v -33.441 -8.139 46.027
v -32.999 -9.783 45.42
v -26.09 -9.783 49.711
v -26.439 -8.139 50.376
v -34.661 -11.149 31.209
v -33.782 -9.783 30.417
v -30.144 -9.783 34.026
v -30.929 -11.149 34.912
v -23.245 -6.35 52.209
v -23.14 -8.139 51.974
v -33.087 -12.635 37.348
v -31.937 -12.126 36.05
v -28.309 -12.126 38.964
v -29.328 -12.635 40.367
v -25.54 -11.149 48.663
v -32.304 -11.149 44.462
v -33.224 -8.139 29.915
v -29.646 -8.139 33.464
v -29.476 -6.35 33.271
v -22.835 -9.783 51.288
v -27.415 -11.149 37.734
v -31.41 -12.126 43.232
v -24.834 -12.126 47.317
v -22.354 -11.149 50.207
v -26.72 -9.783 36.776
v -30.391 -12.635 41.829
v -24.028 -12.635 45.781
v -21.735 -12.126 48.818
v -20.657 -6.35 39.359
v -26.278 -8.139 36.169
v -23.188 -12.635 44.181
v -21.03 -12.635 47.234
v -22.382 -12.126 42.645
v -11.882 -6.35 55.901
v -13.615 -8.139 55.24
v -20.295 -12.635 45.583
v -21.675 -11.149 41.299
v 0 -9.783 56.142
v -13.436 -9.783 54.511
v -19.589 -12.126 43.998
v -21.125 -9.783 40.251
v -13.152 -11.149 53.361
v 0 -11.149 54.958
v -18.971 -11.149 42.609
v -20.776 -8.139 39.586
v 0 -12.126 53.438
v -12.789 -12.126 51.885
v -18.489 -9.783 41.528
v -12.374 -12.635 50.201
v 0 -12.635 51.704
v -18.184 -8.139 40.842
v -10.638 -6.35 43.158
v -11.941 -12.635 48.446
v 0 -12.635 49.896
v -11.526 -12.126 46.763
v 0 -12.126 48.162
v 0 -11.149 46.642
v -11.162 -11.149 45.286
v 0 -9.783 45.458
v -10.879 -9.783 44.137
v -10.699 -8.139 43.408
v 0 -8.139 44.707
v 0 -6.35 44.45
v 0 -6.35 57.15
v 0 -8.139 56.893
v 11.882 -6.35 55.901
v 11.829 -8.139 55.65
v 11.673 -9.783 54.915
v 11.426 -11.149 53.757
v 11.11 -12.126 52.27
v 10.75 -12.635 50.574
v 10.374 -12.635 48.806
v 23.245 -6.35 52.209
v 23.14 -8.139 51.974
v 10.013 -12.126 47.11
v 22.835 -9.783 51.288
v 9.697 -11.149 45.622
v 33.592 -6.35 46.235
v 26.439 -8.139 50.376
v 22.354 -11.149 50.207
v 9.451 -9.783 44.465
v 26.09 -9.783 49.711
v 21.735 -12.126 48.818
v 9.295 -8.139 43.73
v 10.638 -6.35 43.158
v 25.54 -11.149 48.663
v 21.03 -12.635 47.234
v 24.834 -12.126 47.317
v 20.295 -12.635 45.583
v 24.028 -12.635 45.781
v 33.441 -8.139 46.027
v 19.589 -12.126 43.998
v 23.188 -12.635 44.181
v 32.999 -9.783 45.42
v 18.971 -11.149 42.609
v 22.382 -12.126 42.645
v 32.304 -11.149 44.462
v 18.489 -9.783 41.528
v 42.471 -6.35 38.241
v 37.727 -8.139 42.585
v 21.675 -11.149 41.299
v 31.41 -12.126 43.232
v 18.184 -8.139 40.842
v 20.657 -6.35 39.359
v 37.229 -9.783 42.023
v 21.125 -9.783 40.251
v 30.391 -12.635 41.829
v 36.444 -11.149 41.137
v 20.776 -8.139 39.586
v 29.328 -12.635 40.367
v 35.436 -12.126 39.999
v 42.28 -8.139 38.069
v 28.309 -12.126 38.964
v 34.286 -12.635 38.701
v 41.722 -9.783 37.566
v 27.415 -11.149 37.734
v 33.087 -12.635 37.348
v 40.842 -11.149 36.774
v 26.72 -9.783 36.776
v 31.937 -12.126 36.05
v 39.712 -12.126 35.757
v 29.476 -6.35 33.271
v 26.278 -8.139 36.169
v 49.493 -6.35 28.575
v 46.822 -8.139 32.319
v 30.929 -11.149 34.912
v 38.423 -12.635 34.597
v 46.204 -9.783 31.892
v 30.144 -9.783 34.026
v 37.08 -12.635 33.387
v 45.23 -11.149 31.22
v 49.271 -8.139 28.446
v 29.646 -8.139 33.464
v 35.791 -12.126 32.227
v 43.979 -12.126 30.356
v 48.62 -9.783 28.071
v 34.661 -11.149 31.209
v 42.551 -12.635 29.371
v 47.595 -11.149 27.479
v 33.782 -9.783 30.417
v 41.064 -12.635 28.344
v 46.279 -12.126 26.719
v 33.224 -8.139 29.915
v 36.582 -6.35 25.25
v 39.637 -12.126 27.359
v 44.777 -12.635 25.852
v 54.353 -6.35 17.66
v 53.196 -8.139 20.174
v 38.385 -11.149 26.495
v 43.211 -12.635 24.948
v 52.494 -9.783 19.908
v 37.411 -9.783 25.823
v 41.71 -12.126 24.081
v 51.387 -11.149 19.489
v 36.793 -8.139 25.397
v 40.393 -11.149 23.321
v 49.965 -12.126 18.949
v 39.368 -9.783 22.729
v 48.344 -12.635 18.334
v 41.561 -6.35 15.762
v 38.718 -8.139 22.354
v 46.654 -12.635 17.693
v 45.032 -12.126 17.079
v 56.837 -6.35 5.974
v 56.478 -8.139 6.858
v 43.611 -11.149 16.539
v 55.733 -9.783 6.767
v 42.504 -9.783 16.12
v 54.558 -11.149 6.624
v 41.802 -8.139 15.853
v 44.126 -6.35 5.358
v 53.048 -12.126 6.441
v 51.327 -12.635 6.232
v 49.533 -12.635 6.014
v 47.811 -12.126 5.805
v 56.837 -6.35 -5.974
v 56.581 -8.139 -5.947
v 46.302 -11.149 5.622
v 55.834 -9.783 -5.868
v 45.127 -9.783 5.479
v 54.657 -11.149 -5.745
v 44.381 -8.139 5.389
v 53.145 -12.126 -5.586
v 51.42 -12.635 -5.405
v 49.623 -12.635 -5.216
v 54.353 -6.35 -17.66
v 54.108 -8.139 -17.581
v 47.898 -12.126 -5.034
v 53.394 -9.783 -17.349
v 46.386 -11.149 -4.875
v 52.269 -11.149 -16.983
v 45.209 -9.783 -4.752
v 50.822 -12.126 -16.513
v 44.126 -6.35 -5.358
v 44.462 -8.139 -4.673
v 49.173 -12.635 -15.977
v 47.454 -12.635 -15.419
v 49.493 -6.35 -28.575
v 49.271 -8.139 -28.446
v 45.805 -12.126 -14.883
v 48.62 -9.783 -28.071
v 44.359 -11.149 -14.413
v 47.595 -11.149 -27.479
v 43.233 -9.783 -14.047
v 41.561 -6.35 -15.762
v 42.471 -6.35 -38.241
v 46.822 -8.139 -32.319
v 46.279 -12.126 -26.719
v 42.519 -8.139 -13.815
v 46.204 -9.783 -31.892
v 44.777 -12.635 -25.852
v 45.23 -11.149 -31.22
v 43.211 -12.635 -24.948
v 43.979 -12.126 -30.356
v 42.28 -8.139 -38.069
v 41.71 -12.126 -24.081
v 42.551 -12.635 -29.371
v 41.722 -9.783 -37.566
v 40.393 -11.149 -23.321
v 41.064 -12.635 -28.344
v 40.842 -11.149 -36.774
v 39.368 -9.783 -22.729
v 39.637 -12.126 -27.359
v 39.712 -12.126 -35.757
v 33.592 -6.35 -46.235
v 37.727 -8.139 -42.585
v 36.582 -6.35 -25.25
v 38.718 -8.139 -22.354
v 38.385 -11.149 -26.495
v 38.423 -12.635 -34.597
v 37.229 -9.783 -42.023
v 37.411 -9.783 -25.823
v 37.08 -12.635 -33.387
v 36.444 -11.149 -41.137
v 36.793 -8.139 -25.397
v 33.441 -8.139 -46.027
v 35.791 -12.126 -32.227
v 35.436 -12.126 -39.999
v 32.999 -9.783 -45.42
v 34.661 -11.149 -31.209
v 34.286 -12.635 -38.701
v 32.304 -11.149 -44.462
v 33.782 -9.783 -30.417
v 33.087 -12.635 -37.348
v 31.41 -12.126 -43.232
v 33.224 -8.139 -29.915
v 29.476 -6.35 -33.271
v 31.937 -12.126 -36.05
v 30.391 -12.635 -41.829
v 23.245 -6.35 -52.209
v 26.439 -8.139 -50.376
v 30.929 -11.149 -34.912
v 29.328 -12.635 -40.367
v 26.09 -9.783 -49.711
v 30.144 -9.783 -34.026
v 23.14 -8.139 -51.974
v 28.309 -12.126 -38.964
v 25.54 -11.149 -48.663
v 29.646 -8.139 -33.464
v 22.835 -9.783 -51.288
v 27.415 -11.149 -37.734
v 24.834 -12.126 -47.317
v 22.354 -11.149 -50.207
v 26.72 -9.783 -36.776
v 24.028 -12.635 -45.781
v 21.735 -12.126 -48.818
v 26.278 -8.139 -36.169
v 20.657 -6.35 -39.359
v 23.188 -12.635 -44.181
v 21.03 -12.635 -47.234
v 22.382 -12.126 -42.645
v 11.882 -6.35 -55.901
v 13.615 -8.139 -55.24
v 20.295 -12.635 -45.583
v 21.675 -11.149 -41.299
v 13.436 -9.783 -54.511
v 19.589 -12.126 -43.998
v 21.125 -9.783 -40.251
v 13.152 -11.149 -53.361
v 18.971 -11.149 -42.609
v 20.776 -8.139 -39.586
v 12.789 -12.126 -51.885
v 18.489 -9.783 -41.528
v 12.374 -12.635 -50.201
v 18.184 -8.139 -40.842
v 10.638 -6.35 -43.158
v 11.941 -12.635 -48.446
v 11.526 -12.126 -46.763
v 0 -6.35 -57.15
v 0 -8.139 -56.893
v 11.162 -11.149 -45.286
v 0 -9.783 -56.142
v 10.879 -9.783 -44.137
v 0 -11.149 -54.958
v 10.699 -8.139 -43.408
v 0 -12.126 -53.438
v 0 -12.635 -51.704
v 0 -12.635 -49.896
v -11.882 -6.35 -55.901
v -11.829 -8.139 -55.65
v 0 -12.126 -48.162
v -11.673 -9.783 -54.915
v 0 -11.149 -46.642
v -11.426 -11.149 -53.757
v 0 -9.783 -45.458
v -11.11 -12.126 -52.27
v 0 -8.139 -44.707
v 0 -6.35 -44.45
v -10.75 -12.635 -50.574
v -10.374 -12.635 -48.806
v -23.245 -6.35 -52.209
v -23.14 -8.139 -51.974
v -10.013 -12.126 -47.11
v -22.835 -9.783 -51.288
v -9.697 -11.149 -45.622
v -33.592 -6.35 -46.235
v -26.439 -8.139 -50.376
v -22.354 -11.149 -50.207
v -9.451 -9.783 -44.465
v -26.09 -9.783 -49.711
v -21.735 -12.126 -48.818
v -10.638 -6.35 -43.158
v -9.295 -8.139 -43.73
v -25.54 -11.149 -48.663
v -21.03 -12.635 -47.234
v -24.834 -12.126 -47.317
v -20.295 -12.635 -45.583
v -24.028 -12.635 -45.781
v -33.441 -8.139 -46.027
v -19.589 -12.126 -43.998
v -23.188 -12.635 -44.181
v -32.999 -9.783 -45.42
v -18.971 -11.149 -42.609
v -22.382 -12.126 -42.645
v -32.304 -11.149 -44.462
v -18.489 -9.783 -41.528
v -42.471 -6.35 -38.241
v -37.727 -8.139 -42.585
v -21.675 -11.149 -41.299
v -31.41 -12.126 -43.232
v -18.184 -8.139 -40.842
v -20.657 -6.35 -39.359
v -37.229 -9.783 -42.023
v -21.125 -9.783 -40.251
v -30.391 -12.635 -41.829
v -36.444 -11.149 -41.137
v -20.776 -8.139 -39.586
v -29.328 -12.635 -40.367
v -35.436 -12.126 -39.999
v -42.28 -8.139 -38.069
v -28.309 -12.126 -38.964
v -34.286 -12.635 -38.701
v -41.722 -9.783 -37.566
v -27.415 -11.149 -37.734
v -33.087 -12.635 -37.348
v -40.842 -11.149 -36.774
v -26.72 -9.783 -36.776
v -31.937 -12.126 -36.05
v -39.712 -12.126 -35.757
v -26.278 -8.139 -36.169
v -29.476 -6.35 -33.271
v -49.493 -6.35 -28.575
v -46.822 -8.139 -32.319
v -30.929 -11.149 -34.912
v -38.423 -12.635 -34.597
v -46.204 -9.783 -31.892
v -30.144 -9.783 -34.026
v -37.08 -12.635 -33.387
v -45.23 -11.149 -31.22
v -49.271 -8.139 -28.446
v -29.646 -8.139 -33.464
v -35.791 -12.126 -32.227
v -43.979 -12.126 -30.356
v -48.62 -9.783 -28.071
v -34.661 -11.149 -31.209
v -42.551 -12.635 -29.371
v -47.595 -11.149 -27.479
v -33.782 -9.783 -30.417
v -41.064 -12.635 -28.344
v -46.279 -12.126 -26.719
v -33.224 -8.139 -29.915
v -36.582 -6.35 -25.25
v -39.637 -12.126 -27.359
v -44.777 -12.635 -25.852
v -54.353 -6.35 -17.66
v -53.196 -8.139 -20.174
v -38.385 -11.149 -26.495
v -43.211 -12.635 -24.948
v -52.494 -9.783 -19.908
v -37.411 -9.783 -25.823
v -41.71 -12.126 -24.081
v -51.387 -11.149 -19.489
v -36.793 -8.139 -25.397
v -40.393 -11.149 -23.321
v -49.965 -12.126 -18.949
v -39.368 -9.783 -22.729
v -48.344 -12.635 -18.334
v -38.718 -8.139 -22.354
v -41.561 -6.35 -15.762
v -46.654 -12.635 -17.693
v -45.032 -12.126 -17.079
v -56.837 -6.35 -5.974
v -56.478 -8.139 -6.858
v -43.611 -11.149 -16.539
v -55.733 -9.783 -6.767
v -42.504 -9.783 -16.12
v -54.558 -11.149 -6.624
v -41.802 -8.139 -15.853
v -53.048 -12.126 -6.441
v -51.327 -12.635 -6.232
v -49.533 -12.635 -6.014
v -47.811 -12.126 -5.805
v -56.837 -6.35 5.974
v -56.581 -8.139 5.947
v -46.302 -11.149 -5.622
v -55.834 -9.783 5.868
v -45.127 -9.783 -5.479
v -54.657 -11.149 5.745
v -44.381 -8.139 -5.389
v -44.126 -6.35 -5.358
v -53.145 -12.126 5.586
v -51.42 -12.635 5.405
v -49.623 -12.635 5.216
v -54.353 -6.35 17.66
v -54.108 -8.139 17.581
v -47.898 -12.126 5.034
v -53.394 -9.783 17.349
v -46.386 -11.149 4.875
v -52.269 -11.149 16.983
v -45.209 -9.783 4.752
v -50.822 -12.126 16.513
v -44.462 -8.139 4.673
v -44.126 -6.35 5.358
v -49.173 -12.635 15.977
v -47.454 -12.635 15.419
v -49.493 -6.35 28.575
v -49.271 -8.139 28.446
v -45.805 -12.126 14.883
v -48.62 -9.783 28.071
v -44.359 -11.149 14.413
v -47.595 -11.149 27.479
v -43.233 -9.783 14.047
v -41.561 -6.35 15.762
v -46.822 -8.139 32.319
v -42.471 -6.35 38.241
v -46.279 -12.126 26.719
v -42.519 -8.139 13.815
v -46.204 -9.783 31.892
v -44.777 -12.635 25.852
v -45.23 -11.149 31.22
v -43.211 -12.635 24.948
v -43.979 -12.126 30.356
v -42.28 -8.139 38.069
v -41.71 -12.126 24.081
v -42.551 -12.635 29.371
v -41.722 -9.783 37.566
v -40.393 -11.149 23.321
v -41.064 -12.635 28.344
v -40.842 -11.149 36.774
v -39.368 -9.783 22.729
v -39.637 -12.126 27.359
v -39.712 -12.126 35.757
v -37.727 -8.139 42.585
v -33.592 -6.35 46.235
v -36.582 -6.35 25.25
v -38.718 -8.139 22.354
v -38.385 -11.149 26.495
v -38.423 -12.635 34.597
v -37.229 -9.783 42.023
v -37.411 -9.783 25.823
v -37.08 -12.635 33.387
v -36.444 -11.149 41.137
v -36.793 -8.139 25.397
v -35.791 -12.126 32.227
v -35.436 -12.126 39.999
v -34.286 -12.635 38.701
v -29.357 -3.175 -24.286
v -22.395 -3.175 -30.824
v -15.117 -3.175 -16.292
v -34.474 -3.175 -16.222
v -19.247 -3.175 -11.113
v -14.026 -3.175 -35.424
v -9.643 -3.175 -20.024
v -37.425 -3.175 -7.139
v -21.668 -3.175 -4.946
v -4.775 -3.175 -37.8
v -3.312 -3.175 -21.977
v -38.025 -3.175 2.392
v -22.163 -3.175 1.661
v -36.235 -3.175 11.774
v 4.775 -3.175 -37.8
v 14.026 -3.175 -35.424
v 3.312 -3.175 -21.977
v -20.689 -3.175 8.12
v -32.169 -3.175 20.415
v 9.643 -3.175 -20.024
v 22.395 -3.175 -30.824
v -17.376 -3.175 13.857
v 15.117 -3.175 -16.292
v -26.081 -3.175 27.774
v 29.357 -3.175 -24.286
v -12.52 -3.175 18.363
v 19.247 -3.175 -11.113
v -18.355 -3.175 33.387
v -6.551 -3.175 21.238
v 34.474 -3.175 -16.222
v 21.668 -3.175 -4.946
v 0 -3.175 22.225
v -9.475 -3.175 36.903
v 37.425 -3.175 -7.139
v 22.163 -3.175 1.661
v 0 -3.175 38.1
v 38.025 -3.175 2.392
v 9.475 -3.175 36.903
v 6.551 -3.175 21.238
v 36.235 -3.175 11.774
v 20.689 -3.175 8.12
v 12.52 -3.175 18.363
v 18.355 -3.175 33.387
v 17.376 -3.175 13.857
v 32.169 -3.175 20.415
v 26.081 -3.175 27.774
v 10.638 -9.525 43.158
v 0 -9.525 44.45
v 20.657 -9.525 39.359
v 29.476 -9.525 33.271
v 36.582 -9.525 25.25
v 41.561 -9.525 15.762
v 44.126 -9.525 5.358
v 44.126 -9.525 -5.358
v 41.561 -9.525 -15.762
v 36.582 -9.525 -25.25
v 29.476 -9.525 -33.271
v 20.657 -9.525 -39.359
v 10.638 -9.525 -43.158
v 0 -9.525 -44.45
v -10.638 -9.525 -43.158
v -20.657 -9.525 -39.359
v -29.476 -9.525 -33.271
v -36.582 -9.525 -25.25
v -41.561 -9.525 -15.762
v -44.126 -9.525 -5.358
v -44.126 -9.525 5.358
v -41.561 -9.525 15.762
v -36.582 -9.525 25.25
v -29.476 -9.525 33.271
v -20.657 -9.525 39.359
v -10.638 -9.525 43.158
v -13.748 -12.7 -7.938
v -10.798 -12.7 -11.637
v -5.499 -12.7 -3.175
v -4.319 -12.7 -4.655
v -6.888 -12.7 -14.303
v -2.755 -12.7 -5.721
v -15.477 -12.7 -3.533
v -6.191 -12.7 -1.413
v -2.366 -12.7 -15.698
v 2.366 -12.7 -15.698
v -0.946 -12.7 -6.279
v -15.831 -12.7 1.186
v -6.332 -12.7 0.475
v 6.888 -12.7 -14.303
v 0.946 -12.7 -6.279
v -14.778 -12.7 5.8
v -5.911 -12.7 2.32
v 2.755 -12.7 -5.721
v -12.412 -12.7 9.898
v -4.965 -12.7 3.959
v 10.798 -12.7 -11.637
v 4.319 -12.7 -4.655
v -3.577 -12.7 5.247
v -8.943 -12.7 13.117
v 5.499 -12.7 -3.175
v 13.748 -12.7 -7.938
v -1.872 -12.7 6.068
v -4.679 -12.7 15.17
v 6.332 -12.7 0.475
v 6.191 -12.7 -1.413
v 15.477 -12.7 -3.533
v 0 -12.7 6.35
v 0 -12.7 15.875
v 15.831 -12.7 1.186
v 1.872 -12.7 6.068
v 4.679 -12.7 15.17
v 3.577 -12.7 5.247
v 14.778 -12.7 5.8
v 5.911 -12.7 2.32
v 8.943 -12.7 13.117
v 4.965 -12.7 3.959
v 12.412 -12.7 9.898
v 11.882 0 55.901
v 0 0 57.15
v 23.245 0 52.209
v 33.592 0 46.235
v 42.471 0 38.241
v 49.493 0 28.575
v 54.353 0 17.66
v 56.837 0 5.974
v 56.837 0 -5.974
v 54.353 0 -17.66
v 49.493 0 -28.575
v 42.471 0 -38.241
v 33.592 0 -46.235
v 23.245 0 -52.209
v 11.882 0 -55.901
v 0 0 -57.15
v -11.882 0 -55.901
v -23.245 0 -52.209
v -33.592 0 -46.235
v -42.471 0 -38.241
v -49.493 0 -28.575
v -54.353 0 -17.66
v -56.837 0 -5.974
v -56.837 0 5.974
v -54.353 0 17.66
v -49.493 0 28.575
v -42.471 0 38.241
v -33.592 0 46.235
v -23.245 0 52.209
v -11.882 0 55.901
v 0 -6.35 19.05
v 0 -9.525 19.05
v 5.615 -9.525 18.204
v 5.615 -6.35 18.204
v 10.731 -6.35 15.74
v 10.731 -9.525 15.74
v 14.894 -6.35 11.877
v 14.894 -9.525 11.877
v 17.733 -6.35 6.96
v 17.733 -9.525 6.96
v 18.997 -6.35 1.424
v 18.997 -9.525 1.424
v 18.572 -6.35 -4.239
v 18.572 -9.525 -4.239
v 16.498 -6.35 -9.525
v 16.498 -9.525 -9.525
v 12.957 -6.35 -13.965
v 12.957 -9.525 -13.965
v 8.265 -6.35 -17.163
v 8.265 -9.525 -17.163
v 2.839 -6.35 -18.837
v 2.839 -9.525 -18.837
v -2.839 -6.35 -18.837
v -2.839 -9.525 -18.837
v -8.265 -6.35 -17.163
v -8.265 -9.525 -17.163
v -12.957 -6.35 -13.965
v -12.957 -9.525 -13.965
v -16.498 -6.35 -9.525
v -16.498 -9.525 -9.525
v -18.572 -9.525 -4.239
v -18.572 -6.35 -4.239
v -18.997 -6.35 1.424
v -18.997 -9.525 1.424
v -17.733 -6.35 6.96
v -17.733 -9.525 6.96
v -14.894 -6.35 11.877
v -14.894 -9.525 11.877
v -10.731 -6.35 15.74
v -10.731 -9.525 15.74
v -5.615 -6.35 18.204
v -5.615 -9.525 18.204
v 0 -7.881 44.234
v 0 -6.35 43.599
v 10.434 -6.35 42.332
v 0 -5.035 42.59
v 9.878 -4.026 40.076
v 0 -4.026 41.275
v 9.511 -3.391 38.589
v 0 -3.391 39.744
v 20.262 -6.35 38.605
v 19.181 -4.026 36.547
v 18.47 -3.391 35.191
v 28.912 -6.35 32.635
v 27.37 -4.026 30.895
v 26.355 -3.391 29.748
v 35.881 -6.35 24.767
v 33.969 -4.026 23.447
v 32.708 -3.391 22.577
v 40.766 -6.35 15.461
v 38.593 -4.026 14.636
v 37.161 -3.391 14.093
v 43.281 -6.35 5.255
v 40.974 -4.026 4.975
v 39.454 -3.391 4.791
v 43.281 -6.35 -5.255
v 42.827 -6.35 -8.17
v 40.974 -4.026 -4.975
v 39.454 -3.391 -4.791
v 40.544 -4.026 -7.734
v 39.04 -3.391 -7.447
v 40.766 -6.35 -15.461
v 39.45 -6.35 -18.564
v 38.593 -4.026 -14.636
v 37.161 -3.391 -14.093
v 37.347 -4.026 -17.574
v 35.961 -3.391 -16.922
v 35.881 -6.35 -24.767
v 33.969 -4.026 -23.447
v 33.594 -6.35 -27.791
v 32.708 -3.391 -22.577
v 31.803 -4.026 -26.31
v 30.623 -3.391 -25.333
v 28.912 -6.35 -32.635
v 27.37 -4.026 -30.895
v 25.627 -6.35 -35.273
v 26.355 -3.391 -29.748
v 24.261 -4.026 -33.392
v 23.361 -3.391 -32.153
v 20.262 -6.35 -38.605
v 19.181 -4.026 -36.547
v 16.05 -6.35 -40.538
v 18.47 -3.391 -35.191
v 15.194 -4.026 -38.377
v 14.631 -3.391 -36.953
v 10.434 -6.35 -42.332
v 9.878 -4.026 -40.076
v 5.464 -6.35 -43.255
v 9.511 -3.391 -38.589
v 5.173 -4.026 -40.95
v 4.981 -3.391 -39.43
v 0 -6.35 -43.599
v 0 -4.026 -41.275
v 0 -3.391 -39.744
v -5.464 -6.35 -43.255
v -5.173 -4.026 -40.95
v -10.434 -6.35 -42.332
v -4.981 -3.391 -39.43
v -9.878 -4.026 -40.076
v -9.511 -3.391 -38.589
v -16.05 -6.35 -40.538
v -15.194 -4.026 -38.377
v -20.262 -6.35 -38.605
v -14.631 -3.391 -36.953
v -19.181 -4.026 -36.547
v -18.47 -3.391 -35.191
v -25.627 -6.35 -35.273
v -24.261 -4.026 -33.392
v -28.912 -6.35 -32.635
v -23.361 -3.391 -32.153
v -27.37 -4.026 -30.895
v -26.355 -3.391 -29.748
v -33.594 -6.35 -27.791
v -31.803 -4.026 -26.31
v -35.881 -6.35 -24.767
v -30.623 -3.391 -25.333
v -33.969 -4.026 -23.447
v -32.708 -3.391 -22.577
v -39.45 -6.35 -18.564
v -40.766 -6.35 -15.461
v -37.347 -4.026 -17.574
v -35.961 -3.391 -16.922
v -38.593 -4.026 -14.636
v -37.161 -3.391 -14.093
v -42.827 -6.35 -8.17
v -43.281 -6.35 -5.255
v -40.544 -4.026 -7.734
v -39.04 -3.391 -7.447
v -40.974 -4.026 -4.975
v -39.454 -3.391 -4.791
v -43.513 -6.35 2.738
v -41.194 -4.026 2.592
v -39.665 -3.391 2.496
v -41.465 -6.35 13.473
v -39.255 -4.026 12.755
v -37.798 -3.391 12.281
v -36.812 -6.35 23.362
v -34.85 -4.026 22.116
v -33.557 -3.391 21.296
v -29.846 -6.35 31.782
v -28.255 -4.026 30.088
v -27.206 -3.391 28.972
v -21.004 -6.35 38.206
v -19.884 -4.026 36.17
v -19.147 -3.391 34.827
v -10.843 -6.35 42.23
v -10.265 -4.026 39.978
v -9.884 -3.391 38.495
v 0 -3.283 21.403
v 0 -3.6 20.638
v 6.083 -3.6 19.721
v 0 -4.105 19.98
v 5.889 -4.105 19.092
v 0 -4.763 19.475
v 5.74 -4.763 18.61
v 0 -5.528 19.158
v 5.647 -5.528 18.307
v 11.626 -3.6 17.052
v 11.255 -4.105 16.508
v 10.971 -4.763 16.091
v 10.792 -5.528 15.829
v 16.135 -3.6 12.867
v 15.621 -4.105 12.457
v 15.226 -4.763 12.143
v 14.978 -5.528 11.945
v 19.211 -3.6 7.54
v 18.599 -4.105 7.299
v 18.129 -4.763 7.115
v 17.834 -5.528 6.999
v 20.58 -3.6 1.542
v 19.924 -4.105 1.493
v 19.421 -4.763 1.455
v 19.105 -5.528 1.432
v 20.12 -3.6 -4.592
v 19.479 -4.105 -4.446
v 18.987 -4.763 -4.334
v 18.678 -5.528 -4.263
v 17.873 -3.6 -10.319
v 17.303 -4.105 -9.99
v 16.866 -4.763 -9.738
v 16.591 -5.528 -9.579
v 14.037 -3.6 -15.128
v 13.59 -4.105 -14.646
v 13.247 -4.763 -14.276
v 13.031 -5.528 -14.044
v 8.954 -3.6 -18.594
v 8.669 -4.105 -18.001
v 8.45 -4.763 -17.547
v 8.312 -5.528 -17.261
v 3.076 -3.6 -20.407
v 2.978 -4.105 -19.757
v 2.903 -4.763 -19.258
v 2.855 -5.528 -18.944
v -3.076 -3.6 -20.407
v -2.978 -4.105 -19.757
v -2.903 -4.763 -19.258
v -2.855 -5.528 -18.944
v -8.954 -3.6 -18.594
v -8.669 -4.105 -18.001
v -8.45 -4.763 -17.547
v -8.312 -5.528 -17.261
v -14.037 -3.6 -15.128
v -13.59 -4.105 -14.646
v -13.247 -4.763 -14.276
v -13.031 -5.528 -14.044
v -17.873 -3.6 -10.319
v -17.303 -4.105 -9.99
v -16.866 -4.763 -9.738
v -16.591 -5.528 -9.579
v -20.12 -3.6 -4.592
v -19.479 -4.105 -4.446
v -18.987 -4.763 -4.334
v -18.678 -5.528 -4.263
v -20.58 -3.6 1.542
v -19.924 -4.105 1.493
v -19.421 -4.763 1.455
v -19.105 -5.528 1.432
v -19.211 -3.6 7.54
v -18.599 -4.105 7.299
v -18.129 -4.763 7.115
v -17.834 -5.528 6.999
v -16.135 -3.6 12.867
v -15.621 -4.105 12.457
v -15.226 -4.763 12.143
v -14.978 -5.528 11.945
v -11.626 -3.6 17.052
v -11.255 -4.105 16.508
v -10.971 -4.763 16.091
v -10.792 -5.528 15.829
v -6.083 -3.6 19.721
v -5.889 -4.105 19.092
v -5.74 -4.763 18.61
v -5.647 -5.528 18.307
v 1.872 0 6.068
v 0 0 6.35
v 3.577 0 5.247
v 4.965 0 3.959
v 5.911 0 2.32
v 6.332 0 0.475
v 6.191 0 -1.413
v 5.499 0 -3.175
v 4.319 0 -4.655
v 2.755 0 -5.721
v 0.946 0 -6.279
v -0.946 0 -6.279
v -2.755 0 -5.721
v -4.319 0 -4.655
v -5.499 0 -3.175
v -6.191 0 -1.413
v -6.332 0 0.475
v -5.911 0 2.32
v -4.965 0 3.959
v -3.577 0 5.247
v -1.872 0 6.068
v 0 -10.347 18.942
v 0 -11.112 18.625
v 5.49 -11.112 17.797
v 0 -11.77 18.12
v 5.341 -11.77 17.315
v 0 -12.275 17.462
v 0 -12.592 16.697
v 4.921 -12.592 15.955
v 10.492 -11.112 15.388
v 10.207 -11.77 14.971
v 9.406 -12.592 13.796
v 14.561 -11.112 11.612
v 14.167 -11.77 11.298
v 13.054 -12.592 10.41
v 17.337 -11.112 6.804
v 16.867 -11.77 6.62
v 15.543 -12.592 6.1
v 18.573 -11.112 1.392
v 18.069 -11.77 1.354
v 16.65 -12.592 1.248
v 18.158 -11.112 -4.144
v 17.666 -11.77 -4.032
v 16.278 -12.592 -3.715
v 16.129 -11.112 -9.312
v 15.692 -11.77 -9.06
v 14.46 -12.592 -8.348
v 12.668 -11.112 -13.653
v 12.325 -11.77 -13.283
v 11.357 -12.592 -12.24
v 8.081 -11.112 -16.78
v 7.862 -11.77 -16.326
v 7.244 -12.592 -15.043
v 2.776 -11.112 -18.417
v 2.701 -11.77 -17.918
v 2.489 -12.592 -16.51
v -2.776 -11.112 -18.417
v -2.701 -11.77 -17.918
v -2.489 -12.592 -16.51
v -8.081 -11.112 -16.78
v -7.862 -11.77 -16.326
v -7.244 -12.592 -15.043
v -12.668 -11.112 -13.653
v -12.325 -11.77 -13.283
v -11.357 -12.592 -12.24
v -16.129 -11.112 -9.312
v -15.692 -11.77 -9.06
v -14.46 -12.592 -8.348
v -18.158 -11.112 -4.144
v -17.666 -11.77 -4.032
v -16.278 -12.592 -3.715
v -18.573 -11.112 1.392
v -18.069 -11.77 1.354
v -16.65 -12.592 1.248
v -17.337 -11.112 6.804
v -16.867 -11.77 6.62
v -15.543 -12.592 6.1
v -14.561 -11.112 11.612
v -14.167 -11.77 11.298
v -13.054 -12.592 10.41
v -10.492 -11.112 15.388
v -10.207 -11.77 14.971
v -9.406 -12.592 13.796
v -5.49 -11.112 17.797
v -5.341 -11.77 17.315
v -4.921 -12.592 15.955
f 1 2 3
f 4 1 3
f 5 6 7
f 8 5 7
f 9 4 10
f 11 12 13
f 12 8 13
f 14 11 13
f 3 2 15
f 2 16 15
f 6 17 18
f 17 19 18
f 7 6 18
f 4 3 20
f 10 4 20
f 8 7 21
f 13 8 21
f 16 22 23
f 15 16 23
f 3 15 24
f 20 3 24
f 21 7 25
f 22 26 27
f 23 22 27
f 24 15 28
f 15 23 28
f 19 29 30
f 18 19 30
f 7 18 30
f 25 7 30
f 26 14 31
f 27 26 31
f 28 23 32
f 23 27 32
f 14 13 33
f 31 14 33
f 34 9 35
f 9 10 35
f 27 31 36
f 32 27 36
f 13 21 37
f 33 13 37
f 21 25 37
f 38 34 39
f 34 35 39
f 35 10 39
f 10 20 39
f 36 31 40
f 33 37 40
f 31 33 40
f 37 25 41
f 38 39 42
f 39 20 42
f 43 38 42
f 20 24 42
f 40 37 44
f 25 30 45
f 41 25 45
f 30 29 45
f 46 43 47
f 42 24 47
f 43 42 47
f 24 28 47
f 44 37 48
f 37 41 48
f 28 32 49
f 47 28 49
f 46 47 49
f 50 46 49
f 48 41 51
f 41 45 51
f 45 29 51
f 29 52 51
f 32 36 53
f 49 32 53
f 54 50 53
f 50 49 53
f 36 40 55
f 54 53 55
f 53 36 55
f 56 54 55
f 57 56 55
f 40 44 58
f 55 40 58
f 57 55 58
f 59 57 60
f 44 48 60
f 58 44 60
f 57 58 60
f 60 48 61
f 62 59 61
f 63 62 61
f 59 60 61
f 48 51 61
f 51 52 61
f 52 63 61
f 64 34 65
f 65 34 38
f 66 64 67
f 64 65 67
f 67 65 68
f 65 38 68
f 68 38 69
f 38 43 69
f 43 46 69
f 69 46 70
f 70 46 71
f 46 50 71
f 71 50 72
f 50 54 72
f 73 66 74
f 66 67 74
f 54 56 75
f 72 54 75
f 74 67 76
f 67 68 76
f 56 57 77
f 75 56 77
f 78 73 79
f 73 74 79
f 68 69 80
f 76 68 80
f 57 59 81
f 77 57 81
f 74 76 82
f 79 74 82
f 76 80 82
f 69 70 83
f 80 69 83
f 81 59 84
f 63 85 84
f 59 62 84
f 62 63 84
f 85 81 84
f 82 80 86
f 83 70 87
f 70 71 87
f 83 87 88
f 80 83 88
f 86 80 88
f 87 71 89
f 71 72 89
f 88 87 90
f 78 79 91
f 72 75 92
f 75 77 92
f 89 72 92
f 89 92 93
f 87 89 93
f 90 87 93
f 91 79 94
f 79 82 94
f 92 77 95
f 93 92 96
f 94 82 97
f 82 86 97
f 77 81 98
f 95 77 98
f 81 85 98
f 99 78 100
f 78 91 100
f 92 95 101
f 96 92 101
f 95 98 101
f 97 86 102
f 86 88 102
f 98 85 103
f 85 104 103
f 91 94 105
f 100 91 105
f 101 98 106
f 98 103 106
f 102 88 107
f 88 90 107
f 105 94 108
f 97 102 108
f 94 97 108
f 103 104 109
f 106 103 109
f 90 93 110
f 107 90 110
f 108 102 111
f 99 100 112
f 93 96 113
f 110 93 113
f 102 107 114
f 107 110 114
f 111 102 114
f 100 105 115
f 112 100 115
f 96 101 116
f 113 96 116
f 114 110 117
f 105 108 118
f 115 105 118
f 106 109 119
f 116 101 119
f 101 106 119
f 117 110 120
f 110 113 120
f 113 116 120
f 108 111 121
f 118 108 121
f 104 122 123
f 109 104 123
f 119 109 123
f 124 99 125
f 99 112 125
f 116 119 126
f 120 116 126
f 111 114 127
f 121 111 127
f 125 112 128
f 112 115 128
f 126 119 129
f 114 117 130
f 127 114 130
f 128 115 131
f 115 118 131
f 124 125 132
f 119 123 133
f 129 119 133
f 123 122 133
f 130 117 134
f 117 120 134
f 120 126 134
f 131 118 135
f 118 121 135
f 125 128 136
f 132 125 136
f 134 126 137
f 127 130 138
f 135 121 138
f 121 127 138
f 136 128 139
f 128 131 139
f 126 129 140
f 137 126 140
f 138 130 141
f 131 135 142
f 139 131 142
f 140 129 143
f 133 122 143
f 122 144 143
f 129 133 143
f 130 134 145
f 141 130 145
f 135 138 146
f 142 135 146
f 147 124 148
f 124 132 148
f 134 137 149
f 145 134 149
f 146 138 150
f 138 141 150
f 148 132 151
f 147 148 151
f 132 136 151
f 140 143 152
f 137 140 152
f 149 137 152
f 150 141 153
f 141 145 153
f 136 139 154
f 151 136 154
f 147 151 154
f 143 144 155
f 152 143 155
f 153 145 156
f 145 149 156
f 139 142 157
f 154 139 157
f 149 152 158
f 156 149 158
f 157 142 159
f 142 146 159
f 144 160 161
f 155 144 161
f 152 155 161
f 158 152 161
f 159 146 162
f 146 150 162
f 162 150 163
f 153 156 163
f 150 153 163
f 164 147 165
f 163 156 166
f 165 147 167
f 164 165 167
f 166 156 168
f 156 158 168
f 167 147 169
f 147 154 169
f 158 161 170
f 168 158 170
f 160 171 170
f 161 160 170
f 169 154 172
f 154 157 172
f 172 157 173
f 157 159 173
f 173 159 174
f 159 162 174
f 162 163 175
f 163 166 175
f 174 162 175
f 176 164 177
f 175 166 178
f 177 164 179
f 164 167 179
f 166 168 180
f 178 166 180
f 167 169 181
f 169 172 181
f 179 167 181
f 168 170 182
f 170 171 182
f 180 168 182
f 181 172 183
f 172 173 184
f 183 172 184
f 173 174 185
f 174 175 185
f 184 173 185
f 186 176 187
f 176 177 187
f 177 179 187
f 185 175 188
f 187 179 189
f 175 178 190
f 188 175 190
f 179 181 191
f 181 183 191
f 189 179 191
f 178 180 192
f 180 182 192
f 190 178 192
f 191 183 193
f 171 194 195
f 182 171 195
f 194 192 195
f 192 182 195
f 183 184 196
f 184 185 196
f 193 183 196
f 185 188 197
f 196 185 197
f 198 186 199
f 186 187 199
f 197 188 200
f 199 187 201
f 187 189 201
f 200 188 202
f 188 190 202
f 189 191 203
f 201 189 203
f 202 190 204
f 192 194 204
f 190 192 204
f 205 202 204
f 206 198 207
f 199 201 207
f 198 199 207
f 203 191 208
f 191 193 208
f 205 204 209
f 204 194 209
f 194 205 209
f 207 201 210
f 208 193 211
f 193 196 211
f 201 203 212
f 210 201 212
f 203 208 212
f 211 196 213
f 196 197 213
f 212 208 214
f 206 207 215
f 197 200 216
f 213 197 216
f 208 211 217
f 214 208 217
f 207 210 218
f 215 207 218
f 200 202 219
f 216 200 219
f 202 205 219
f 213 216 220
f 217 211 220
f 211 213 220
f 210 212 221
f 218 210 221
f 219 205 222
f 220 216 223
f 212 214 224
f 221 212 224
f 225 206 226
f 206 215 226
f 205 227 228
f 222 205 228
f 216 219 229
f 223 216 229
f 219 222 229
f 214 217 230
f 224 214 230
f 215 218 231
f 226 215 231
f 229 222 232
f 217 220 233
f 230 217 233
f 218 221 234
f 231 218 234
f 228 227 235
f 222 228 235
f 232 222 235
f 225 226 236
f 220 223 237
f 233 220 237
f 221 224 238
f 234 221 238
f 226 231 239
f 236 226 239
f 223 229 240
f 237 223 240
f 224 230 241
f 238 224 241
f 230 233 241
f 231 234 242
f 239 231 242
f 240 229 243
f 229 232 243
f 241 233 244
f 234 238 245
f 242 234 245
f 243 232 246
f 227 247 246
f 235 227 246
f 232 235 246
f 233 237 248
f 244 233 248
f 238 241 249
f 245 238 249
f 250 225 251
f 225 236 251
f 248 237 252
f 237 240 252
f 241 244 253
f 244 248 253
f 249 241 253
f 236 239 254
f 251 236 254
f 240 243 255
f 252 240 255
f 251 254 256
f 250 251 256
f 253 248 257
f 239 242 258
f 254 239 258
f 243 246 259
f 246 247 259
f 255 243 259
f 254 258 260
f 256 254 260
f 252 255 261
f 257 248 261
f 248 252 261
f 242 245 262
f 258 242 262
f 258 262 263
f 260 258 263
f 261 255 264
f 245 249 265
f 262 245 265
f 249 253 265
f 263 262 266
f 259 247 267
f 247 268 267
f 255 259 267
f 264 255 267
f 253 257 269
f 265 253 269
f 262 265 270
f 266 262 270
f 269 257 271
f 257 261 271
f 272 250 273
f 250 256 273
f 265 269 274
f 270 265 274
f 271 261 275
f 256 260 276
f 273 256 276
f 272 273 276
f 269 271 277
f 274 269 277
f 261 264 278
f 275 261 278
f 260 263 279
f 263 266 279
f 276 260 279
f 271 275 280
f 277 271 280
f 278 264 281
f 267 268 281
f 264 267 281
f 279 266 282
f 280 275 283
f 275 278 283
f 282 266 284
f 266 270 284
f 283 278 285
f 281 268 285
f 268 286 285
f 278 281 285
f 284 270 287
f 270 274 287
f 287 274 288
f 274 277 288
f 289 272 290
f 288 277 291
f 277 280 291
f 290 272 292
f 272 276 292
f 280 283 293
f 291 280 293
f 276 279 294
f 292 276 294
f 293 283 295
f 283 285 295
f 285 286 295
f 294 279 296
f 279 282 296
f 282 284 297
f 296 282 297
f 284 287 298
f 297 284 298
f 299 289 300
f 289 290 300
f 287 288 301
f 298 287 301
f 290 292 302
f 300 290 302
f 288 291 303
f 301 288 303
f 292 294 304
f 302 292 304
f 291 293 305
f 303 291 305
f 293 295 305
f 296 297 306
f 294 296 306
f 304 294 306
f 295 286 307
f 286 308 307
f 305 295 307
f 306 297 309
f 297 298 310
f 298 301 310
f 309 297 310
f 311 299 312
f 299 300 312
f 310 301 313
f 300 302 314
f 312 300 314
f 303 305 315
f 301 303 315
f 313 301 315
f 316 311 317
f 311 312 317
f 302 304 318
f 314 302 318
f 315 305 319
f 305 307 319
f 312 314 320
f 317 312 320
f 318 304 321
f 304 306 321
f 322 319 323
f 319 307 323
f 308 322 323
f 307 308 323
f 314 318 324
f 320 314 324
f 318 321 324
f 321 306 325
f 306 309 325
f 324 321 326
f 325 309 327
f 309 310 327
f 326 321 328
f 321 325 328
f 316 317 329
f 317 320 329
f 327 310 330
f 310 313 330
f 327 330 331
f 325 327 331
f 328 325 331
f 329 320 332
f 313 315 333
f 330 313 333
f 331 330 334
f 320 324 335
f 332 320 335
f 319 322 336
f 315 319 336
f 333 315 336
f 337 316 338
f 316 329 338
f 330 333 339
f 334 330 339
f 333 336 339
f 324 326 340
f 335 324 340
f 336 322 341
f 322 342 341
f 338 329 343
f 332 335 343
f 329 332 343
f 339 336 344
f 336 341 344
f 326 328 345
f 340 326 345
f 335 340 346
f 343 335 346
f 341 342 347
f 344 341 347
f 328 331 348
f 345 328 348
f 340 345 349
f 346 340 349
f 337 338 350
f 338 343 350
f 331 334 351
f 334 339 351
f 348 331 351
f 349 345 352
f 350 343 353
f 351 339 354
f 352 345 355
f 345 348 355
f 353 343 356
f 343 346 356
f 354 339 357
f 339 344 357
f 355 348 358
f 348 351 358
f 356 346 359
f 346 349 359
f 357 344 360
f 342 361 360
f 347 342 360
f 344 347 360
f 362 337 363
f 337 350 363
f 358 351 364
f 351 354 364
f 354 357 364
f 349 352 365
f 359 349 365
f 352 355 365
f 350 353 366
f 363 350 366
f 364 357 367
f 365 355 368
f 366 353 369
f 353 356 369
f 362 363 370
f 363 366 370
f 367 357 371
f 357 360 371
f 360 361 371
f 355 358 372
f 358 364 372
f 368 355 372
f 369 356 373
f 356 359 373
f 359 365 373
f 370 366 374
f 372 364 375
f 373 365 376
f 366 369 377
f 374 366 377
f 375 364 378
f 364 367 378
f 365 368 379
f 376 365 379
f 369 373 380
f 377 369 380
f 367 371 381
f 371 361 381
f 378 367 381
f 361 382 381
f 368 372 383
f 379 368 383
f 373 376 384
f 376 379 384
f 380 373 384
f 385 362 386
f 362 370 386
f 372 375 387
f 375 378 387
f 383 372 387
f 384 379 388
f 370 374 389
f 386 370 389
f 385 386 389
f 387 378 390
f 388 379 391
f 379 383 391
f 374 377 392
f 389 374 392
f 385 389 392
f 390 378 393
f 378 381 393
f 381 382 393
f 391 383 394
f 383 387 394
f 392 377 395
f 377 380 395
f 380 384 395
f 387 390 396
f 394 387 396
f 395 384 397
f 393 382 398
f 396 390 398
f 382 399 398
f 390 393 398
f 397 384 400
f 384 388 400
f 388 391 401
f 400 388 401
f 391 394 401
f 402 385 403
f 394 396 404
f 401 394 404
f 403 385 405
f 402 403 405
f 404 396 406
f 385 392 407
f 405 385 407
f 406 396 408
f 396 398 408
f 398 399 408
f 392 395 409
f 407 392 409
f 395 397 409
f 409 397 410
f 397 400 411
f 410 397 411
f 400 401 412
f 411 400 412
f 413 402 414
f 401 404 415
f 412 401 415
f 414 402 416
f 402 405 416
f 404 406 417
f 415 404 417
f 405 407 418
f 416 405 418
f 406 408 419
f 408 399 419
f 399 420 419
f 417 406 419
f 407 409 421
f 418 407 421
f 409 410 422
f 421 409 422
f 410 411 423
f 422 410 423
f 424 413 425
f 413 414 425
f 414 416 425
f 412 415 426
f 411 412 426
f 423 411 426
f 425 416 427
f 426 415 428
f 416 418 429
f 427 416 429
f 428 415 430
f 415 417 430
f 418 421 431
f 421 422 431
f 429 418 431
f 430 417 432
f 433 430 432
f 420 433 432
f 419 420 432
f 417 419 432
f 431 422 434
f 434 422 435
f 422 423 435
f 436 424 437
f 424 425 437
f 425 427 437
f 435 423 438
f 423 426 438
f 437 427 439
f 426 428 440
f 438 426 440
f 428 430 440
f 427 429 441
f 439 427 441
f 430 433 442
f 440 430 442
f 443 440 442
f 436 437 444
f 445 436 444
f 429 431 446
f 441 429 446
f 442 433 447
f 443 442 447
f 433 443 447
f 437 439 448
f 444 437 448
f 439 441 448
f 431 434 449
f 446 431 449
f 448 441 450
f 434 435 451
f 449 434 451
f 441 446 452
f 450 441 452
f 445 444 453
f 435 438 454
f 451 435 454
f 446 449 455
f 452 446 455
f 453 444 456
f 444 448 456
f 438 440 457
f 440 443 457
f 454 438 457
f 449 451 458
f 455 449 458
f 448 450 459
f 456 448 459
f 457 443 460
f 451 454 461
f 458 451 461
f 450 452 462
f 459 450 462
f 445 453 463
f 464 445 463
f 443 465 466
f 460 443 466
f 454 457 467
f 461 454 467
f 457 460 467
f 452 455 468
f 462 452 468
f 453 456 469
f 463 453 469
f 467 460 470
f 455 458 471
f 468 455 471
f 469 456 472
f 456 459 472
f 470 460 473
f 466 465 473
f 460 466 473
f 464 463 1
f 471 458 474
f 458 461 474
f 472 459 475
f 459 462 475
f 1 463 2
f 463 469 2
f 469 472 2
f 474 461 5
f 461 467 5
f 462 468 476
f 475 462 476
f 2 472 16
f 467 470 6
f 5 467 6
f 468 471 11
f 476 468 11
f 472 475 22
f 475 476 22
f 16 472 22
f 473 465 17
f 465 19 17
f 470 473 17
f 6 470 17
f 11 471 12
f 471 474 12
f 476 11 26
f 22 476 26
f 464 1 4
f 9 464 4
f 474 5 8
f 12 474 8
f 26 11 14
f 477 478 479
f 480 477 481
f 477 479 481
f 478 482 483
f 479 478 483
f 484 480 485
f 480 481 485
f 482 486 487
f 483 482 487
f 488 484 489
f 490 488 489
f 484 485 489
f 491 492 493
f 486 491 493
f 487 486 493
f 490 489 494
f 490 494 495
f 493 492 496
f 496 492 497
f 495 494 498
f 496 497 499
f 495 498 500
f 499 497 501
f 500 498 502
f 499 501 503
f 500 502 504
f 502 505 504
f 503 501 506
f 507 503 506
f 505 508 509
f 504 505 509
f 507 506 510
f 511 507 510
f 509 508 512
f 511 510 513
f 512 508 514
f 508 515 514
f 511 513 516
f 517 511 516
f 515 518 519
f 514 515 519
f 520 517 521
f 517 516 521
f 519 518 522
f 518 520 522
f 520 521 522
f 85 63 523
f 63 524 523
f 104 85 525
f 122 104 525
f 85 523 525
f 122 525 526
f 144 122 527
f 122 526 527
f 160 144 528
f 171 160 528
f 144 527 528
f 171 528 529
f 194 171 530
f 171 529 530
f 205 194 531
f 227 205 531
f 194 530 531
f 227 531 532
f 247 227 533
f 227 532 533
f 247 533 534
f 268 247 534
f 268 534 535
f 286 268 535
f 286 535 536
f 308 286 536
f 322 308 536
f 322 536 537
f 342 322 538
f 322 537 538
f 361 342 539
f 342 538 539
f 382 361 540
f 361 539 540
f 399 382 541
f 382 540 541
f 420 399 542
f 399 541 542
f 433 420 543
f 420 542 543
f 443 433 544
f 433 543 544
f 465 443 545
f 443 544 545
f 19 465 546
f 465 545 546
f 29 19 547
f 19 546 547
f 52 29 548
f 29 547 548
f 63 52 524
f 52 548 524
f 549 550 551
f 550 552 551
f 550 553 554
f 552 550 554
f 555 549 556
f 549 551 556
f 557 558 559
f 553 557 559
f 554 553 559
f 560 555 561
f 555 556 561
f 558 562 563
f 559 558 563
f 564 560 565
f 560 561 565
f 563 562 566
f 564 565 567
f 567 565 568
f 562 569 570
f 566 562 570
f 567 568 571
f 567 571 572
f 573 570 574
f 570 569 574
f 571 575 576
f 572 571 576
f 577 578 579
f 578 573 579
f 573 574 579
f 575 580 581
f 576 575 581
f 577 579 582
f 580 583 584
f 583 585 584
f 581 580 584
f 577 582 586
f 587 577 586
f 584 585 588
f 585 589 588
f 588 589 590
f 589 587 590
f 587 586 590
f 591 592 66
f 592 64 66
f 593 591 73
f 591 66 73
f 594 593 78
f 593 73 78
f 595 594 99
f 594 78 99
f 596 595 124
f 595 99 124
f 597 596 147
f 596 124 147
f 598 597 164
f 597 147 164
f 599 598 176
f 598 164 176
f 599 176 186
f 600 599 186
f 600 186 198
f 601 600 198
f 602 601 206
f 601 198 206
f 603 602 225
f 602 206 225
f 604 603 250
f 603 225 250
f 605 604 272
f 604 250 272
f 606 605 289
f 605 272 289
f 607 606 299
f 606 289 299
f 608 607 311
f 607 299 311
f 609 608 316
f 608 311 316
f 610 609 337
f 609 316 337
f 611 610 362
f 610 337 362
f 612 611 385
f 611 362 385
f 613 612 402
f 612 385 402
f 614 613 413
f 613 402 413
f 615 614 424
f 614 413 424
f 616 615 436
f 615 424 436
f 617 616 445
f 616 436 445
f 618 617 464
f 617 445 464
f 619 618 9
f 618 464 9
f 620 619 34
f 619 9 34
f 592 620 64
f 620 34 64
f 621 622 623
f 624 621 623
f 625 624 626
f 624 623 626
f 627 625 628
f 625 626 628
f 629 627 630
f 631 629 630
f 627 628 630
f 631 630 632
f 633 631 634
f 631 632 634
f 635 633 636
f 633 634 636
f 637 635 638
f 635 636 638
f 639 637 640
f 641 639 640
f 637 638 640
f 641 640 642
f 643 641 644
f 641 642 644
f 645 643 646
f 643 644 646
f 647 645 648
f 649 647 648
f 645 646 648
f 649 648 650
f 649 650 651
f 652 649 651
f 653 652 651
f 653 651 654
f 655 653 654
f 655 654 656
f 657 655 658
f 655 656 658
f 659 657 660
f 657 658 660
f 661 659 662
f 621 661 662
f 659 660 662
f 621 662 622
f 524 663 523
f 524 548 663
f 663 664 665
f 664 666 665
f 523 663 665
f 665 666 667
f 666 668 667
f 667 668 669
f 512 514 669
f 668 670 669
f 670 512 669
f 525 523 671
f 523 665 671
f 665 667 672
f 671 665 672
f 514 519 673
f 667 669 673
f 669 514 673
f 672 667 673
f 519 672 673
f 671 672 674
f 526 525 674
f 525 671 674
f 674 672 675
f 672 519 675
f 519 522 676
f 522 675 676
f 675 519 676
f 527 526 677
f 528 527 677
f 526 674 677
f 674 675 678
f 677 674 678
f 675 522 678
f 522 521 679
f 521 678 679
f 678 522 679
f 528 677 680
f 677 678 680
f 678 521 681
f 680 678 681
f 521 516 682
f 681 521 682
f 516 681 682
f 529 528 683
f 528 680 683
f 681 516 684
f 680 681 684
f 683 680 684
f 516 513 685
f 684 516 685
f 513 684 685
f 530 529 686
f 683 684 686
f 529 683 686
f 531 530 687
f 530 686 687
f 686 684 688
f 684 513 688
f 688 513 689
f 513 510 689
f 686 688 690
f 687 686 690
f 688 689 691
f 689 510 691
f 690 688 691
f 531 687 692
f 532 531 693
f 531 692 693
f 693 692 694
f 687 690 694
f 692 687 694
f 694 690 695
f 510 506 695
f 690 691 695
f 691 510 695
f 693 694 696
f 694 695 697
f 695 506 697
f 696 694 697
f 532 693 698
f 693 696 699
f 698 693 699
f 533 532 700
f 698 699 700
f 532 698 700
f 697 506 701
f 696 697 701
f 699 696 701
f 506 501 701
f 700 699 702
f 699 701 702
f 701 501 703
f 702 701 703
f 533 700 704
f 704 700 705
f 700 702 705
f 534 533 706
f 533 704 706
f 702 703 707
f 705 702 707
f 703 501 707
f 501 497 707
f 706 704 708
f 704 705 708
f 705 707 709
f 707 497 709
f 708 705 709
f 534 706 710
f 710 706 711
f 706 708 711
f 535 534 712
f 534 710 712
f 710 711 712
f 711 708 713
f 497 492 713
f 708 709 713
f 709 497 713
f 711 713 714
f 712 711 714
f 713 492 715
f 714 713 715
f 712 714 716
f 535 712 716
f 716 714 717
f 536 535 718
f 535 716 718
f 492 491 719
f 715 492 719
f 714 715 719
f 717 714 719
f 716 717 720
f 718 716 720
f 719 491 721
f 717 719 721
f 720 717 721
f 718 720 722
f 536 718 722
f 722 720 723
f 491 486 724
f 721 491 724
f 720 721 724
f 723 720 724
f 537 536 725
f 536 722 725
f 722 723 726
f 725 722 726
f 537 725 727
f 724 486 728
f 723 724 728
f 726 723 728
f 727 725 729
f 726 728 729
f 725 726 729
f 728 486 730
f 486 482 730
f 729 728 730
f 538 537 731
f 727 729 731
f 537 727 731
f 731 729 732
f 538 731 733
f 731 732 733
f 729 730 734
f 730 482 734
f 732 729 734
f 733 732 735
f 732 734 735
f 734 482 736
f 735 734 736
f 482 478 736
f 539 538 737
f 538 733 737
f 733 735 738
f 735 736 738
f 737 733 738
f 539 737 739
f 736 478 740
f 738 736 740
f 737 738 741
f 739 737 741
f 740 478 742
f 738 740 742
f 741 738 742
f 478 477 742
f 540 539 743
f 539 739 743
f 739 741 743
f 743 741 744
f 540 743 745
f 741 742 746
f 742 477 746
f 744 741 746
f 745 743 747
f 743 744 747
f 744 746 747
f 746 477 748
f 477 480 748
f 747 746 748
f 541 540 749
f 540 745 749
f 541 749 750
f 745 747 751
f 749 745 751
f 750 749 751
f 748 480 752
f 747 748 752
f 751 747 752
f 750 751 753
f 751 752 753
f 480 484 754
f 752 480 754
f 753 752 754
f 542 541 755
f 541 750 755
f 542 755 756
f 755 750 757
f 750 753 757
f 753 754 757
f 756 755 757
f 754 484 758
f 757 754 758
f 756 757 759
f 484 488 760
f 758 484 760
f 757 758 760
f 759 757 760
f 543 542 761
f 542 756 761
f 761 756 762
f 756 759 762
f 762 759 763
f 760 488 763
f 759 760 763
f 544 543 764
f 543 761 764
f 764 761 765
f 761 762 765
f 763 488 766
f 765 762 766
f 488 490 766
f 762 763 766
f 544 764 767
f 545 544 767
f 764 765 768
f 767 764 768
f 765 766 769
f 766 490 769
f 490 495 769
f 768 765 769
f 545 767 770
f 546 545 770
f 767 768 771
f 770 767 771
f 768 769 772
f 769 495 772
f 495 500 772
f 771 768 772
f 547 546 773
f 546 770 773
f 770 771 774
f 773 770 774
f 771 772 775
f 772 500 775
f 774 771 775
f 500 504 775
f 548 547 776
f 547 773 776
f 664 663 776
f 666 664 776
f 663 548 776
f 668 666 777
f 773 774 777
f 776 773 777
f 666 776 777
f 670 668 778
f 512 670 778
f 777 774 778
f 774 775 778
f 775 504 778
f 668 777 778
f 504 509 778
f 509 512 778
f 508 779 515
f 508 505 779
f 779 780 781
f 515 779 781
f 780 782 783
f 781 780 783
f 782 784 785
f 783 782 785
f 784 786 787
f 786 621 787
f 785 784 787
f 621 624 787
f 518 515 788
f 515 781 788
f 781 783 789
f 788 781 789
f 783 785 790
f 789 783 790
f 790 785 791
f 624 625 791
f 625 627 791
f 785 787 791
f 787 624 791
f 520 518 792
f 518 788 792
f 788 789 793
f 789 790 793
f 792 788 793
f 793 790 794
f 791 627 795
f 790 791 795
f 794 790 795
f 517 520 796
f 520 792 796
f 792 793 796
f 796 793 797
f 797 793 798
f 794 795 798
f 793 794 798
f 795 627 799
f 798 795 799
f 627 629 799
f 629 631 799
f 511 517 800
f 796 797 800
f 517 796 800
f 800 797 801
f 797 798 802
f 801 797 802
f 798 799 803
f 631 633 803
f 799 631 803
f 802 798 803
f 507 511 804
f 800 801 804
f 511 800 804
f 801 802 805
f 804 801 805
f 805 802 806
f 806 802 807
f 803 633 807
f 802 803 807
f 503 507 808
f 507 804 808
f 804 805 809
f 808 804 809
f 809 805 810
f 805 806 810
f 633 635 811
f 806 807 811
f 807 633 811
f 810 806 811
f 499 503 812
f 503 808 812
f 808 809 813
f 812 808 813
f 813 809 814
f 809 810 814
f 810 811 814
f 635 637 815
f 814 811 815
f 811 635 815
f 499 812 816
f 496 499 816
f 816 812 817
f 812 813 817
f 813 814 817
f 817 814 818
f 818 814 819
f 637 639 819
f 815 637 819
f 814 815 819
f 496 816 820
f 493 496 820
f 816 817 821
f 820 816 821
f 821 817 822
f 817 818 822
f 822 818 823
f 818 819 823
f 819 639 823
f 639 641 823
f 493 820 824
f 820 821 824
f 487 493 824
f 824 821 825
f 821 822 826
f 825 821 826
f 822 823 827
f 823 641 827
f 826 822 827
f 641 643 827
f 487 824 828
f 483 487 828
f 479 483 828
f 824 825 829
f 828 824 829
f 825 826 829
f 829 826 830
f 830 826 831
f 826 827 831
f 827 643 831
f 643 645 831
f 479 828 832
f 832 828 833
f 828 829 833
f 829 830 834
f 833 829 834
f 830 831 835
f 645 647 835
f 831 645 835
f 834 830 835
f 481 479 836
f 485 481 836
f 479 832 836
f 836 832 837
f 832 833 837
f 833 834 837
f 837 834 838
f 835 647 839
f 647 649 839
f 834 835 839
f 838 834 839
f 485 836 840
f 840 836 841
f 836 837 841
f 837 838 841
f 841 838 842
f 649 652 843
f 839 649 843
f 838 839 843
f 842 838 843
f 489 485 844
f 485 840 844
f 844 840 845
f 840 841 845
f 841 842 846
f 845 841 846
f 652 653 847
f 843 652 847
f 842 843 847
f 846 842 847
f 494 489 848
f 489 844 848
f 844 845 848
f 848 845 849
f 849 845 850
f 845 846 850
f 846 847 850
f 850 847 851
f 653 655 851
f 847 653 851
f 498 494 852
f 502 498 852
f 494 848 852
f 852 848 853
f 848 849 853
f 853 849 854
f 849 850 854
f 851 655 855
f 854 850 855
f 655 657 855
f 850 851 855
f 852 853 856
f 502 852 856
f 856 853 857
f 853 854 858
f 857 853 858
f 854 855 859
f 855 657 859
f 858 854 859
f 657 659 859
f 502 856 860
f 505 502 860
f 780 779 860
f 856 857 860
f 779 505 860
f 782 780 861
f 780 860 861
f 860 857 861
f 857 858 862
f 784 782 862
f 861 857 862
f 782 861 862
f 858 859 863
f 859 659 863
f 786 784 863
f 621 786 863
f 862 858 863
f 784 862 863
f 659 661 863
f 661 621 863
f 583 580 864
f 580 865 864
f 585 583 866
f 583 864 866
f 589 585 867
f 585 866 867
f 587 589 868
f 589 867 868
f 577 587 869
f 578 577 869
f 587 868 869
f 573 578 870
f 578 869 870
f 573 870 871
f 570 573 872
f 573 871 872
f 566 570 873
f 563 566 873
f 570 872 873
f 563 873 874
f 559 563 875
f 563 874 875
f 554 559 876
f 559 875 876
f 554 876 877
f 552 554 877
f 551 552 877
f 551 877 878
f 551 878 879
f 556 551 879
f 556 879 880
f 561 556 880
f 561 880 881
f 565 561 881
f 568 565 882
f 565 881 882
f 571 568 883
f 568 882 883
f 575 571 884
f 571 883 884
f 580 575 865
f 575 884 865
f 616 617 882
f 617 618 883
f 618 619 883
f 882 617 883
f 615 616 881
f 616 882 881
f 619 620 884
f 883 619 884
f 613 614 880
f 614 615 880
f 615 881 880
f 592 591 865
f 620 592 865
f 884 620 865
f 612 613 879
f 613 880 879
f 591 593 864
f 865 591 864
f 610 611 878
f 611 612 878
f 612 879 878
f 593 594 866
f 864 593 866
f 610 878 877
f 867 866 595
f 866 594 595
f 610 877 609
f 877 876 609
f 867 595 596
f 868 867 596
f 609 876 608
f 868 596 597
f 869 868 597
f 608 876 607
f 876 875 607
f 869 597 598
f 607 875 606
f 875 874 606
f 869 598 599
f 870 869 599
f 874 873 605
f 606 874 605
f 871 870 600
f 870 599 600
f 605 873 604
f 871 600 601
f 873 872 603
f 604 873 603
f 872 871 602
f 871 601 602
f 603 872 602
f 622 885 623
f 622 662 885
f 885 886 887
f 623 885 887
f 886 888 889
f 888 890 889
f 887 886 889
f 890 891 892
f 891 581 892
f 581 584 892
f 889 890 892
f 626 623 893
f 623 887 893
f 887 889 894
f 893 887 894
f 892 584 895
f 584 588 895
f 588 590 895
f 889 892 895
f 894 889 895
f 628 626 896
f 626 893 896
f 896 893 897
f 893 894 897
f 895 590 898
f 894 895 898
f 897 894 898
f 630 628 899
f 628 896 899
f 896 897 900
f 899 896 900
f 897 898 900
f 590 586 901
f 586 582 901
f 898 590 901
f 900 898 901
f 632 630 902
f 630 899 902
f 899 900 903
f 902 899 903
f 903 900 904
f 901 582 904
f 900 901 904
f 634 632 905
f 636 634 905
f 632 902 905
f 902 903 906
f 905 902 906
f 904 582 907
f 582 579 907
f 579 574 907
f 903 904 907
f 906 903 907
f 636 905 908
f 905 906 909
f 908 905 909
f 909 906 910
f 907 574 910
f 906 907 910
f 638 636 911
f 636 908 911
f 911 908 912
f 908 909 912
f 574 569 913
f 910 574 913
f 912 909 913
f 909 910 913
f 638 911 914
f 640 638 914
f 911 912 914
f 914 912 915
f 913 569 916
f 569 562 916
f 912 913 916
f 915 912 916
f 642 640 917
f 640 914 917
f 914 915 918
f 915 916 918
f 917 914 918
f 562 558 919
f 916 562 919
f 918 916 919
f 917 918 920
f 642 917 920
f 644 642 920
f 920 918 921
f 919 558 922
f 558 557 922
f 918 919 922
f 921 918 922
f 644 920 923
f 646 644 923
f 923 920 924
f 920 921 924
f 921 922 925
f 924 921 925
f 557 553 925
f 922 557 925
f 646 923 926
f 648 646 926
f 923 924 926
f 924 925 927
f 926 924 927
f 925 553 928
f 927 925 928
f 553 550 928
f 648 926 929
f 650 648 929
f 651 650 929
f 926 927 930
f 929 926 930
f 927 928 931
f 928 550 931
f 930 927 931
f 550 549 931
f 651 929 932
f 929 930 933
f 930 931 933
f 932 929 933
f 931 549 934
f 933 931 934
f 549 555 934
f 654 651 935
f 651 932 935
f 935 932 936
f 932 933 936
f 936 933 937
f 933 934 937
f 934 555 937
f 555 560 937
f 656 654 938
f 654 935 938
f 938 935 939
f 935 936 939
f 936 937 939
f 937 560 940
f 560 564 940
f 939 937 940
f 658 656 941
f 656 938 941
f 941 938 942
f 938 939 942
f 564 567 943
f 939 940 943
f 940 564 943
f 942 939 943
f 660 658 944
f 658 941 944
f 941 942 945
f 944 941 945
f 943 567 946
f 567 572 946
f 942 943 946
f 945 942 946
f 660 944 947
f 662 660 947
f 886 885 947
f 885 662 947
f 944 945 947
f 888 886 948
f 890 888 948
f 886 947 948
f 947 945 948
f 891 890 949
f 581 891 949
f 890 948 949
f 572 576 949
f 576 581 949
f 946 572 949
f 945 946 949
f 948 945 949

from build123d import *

# Parameters (mm, degrees)
F2_R = 3.175


with BuildPart() as f1:
    # F0 (on Right) → F1 (revolve)
    with BuildSketch(Plane.YZ):
        with BuildLine():
            Line((-12.7, 6.35), (0, 6.35))
            Line((0, 6.35), (0, 57.15))
            Line((0, 57.15), (-6.35, 57.15))
            ThreePointArc((-6.35, 57.15), (-12.7, 50.8), (-6.35, 44.45))
            Line((-6.35, 44.45), (-9.525, 44.45))
            ThreePointArc((-9.525, 44.45), (-5.034872, 42.590128), (-3.175, 38.1))
            Line((-3.175, 38.1), (-3.175, 19.05))
            Line((-3.175, 19.05), (-12.7, 19.05))
            Line((-12.7, 19.05), (-12.7, 6.35))
        make_face()
    revolve(axis=Axis((0, 10.707394, 0), (0, 1, 0)))

    # F2
    f2_edges = [f1.edges().sort_by_distance(p)[0] for p in [
        (0, -3.175, -19.05),
        (0, -12.7, -19.05),
    ]]
    fillet(f2_edges, radius=F2_R)


solid = f1.part
